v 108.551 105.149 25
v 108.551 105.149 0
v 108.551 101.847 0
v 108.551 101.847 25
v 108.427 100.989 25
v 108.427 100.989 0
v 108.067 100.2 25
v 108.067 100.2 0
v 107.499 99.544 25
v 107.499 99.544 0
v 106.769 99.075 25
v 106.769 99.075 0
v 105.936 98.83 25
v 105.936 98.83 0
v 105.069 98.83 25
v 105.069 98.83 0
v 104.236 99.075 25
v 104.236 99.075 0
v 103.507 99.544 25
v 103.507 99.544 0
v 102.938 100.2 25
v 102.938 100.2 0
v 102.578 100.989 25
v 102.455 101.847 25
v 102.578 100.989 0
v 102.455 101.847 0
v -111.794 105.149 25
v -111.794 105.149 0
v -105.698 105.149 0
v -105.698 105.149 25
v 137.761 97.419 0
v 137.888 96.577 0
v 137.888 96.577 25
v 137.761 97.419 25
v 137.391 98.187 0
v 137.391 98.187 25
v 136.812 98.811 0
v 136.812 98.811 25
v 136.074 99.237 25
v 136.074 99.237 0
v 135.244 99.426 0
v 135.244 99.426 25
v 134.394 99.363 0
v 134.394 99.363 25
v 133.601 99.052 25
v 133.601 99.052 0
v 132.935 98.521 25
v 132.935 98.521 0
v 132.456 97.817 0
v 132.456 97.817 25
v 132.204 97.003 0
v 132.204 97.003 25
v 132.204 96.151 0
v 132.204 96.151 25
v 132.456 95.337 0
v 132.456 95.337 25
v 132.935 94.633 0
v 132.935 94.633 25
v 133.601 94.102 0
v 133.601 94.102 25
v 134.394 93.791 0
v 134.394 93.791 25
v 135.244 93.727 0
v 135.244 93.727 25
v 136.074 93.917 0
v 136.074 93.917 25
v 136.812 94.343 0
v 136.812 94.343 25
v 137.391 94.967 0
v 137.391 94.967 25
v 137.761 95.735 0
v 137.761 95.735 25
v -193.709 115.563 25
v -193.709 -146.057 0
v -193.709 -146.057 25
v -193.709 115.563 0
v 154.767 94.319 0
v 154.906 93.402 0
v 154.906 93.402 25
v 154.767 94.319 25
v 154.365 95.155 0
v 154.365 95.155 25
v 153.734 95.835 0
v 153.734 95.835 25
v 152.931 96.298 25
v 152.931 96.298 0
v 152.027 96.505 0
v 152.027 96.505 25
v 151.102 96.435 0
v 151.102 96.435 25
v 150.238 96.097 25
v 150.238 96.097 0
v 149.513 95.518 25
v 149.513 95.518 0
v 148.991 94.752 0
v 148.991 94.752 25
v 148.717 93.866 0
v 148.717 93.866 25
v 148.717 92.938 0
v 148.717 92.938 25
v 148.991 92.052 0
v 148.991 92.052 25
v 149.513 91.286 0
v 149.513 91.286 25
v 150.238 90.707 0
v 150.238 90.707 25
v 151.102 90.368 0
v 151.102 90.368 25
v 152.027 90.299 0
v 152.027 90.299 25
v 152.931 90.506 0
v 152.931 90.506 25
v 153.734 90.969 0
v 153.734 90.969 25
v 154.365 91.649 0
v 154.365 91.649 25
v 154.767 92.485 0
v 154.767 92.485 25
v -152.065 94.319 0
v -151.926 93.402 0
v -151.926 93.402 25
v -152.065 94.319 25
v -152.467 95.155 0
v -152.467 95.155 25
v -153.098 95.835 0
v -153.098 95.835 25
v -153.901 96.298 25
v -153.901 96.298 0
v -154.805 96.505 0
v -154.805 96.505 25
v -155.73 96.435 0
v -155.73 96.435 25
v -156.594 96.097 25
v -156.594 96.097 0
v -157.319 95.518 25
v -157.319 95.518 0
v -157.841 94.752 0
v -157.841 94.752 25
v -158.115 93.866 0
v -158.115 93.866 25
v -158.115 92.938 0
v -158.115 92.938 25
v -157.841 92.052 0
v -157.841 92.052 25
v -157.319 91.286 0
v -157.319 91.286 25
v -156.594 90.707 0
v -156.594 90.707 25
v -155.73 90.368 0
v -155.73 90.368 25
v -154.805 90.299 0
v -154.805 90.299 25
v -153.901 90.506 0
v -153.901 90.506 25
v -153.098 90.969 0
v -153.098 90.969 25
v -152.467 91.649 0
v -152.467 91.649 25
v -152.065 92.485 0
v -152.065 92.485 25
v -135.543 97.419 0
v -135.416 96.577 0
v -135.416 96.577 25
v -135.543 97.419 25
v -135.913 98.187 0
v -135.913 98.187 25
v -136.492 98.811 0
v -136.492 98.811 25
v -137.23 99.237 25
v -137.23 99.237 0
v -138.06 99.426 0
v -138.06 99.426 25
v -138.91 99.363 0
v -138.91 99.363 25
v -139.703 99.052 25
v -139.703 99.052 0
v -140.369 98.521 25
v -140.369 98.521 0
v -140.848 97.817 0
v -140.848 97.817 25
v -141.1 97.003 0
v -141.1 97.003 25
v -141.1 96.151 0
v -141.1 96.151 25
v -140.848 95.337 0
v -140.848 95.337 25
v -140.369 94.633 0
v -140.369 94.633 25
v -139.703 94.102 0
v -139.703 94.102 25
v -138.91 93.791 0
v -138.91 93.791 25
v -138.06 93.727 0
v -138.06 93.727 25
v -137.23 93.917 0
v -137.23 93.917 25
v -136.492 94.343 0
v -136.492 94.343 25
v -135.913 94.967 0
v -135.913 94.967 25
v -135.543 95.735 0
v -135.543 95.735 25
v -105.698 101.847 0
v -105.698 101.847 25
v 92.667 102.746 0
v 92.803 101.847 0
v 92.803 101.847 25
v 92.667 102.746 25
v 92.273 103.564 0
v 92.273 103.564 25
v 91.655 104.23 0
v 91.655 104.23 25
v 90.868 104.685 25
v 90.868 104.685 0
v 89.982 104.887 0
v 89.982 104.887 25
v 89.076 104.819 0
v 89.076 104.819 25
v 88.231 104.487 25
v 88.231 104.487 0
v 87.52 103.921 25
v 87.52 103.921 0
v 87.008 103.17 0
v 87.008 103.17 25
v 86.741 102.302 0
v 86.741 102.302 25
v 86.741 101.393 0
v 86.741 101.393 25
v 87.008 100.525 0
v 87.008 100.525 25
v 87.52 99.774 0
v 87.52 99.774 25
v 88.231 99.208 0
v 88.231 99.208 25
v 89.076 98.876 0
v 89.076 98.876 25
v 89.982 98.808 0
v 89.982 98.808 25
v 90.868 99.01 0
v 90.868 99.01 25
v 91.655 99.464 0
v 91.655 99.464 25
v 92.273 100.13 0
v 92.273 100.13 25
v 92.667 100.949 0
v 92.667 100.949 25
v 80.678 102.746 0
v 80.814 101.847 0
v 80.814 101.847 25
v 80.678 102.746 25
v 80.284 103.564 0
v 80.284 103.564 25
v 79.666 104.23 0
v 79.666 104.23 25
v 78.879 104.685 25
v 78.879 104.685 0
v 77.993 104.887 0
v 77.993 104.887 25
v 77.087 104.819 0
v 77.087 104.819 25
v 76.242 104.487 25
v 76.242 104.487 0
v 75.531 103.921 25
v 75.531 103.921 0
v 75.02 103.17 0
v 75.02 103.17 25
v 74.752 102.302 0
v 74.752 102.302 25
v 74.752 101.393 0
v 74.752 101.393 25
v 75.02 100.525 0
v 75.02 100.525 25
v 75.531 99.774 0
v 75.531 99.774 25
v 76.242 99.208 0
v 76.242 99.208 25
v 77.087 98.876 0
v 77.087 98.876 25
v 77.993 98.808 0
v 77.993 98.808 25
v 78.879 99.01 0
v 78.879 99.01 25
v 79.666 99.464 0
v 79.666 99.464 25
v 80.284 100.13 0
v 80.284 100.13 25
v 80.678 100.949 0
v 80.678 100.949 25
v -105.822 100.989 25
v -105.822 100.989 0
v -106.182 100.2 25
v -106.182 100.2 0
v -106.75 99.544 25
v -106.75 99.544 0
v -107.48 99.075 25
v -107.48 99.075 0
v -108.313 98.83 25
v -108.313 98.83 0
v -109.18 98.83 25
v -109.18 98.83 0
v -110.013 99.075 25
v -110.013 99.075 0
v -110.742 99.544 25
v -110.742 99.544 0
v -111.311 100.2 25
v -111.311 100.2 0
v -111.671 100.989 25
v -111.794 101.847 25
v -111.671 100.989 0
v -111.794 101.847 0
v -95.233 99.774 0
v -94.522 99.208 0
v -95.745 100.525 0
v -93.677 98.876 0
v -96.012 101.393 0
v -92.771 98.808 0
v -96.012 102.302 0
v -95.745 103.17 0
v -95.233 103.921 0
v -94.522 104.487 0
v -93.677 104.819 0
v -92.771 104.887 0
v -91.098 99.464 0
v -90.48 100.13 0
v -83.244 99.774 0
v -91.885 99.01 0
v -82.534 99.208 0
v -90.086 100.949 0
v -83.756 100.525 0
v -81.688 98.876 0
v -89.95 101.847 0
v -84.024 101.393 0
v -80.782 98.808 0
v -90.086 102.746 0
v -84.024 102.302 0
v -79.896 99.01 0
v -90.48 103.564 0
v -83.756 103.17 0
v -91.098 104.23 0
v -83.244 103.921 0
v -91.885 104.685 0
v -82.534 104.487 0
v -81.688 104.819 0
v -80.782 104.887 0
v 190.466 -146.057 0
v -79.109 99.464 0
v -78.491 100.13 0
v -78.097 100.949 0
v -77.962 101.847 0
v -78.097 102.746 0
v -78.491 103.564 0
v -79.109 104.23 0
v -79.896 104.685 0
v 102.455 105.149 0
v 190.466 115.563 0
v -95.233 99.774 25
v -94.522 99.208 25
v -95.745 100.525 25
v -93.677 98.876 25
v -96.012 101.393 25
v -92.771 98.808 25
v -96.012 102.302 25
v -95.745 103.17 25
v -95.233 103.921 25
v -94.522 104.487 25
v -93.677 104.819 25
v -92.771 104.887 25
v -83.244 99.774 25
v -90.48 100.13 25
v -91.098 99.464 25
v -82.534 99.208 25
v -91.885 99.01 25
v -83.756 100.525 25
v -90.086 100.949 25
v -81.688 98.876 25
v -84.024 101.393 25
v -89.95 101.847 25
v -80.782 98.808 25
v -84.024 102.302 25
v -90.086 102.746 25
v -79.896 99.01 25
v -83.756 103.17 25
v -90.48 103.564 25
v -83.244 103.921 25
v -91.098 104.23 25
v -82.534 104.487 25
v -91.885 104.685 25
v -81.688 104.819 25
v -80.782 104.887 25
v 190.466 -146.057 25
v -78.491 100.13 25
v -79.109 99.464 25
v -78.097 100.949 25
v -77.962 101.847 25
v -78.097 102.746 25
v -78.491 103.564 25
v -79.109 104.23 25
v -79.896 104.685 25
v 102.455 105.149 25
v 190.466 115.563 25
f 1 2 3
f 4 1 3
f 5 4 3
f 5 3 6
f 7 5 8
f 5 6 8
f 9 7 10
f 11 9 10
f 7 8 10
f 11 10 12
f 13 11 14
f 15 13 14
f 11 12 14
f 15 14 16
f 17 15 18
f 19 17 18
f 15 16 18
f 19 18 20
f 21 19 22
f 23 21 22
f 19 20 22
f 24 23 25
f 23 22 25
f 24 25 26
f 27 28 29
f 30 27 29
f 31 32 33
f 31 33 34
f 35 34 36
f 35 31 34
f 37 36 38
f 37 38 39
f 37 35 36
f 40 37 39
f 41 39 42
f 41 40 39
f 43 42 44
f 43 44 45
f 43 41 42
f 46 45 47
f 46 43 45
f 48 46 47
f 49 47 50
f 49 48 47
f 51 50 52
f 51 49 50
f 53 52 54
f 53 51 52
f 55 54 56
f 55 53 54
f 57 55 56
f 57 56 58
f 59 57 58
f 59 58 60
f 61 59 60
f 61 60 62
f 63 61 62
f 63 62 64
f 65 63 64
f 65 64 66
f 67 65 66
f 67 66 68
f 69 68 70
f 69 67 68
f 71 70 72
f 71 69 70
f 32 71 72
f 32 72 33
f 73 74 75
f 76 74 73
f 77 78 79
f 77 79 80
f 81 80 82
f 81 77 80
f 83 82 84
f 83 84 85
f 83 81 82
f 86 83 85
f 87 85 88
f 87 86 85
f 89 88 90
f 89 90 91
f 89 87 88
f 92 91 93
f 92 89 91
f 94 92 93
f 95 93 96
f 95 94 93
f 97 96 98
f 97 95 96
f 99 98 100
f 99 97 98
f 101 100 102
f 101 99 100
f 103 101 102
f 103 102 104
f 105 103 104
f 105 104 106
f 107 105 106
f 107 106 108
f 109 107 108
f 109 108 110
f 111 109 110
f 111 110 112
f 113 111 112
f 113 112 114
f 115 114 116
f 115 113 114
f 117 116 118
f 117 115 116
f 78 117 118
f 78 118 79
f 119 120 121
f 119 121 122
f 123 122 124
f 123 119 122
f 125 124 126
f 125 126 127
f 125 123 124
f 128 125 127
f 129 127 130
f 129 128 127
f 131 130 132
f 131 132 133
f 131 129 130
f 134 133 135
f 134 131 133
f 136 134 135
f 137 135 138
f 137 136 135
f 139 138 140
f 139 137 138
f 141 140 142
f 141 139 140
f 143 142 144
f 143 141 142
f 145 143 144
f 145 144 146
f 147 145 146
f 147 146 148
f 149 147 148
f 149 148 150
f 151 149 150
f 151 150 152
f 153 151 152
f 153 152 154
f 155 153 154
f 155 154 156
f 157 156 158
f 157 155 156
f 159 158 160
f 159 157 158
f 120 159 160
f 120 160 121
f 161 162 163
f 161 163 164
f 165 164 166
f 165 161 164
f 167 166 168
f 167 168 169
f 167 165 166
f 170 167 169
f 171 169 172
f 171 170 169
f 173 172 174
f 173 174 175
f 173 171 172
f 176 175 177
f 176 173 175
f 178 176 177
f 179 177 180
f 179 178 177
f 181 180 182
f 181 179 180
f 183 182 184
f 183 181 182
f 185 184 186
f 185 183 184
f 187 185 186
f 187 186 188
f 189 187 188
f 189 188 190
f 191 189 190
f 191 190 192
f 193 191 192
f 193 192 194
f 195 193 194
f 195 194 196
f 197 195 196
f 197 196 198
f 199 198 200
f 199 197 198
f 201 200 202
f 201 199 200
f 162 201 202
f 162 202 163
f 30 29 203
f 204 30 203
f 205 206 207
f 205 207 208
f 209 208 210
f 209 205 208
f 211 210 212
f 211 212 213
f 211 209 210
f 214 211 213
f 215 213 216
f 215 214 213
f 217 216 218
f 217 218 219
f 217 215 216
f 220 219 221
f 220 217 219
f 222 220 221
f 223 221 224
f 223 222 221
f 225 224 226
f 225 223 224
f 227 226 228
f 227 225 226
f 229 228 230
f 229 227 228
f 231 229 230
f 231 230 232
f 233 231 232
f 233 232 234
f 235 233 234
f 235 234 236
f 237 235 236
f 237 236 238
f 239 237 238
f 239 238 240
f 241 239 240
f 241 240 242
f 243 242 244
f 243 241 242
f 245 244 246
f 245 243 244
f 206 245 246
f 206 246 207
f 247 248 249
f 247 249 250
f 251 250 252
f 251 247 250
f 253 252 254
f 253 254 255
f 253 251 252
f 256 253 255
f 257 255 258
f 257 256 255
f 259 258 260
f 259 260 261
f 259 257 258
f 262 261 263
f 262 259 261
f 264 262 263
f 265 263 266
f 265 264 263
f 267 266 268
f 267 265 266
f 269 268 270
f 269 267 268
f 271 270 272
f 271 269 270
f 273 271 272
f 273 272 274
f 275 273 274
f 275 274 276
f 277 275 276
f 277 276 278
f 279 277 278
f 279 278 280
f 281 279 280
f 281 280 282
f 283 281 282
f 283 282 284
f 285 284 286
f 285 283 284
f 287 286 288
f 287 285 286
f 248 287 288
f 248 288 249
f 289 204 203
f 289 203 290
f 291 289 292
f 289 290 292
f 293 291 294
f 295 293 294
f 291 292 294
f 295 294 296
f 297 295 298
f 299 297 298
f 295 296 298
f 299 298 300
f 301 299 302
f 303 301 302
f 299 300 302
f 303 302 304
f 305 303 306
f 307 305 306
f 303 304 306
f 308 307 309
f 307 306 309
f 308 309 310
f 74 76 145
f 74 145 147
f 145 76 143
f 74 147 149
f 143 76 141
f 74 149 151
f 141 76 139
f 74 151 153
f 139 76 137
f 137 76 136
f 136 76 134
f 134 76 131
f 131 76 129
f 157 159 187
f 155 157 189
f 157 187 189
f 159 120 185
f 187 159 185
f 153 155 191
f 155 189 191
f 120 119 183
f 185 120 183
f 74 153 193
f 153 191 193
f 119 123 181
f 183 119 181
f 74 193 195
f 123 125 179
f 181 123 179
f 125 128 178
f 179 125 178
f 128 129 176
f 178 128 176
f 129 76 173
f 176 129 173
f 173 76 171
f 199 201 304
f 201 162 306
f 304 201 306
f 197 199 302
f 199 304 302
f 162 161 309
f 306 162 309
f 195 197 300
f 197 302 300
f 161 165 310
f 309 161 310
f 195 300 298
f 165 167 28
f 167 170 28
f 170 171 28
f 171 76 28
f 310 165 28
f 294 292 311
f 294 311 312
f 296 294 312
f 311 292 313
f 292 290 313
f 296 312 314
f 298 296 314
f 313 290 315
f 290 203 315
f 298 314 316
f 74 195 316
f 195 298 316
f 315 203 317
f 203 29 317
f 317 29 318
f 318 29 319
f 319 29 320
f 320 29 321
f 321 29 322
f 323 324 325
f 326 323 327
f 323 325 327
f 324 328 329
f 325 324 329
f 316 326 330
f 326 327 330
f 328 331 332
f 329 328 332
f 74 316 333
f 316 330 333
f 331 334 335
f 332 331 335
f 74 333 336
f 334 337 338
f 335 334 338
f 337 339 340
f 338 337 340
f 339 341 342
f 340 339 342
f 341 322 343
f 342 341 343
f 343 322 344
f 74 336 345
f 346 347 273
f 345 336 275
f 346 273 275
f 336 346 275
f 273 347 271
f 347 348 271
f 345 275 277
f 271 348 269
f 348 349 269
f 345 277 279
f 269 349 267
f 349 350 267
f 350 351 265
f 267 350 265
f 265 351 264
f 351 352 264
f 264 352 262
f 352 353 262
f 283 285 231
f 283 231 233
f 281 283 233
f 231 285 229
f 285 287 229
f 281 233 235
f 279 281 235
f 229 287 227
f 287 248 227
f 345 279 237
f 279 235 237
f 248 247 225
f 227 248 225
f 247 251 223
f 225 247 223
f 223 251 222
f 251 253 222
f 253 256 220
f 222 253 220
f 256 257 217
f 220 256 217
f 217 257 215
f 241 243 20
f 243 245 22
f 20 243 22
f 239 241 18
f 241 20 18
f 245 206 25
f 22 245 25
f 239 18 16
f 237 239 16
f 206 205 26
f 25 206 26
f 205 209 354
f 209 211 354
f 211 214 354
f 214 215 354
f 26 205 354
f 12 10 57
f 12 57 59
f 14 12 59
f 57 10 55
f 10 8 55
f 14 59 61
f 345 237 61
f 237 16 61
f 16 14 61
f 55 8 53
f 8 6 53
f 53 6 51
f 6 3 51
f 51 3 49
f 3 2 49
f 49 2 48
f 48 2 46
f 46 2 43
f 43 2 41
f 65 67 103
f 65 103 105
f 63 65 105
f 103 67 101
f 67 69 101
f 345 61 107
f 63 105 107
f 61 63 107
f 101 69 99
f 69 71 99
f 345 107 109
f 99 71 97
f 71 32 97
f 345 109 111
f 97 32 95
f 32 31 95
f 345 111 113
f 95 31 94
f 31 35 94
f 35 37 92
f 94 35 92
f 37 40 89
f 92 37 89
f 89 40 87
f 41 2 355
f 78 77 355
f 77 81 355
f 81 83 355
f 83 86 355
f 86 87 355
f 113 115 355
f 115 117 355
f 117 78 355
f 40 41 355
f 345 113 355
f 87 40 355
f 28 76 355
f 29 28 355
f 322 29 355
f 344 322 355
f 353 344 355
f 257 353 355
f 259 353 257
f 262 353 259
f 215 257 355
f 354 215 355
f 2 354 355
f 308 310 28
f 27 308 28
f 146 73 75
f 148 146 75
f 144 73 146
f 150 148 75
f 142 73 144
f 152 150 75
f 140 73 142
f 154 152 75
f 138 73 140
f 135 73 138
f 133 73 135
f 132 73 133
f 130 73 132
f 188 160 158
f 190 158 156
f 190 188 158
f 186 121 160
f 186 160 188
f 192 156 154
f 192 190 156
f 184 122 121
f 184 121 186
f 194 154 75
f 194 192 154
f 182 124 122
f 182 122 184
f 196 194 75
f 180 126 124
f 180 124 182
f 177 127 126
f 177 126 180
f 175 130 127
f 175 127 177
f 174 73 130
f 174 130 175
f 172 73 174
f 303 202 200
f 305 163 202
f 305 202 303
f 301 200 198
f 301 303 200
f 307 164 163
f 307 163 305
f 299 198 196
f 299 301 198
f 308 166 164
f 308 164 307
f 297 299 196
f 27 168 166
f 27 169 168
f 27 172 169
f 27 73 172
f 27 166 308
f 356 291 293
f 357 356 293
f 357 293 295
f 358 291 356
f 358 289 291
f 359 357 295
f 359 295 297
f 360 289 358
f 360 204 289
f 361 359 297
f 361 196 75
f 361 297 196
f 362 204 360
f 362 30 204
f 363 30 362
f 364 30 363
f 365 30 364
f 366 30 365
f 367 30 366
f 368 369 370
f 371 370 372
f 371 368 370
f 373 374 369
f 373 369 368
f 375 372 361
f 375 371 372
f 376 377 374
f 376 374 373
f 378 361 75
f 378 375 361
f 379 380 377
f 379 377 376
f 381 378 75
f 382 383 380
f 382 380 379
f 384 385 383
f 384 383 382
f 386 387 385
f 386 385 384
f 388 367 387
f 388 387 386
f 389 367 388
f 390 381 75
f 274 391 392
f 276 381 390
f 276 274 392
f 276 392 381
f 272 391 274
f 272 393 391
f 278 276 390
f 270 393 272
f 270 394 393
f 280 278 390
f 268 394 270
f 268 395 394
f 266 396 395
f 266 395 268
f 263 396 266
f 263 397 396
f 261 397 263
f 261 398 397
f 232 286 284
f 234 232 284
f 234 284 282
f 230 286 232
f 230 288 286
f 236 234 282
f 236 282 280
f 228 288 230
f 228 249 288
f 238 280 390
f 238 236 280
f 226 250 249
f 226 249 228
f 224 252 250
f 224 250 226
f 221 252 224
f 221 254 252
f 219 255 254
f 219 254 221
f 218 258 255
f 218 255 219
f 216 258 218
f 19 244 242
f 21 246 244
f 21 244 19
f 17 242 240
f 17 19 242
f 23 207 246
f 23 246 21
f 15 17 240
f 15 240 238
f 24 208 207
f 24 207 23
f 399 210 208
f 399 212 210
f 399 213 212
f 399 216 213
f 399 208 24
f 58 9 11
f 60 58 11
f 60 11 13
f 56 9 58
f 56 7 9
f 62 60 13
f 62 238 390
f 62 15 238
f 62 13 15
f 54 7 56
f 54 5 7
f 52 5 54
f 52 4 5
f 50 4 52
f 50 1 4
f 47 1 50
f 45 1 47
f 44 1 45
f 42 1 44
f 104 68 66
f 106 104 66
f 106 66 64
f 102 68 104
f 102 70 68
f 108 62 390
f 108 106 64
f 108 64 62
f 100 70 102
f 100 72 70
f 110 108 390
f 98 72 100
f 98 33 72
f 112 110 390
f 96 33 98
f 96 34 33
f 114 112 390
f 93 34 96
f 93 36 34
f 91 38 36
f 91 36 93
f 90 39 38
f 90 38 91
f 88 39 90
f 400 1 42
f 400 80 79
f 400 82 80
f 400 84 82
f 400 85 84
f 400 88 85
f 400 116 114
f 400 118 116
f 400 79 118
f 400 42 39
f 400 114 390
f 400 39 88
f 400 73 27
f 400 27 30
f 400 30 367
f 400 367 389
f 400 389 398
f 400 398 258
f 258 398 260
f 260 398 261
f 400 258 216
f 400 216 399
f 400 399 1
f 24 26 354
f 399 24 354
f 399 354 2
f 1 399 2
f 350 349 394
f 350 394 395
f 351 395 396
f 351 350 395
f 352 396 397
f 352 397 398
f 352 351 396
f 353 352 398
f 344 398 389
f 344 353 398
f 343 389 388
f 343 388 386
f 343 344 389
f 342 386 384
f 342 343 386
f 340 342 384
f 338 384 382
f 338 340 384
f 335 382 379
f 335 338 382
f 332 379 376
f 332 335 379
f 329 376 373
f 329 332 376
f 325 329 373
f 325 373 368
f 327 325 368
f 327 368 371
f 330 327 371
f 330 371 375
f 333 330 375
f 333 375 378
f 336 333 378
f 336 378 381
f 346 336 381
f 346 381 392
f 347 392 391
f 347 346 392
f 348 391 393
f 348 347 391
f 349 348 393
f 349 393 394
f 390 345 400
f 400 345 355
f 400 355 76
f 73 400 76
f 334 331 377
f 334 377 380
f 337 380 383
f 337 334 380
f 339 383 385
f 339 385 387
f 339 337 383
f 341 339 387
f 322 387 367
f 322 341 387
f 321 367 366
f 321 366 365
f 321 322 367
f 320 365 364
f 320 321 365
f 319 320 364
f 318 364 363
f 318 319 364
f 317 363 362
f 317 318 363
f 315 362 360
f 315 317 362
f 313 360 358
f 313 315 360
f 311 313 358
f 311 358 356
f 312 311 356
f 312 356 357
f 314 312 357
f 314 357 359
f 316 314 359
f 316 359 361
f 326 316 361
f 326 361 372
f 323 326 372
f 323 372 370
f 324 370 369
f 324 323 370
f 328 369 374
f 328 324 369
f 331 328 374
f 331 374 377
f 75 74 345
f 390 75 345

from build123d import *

# Parameters (mm, degrees)
F0_W     = 192.0875
F0_H     = 261.62
F0_R     = 3.048
F0_R_2   = 2.8575
F0_R_3   = 3.1115
F1_DEPTH = 25


with BuildPart() as f1:
    # F0 (on Top) → F1 (new body)
    with BuildSketch(Plane.XY):
        with Locations((-97.6657310909, -15.2465730985)):
            Rectangle(F0_W, F0_H)
        Polygon((-159.5464810909, 107.4395775795), (-75.4724810909, 107.4395775795), (-75.4724810909, 88.3854269015), (-159.5464810909, 88.3854269015), (-159.5464810909, 100.9584269015), align=None, mode=Mode.SUBTRACT)
        with Locations((94.4217689091, -15.2465730985)):
            Rectangle(F0_W, F0_H)
        Polygon((156.3025189091, 88.3854269015), (72.2285189091, 88.3854269015), (72.2285189091, 107.4395775795), (156.3025189091, 107.4395775795), (156.3025189091, 100.9584269015), align=None, mode=Mode.SUBTRACT)
        Polygon((72.2285189091, 107.4395775795), (72.2285189091, 88.3854269015), (156.3025189091, 88.3854269015), (156.3025189091, 100.9584269015), (156.3025189091, 107.4395775795), align=None)
        with Locations((77.7657189091, 101.8474269015)):
            Circle(F0_R, mode=Mode.SUBTRACT)
        with Locations((89.7545189091, 101.8474269015)):
            Circle(F0_R, mode=Mode.SUBTRACT)
        with Locations((135.0300189091, 96.5769269015)):
            Circle(F0_R_2, mode=Mode.SUBTRACT)
        with BuildLine():
            ThreePointArc((108.5505189091, 101.8474269015), (105.5025189091, 98.7994269015), (102.4545189091, 101.8474269015))
            Line((102.4545189091, 101.8474269015), (102.4545189091, 105.1494269015))
            Line((102.4545189091, 105.1494269015), (108.5505189091, 105.1494269015))
            Line((108.5505189091, 105.1494269015), (108.5505189091, 101.8474269015))
        make_face(mode=Mode.SUBTRACT)
        with Locations((151.7940189091, 93.4019269015)):
            Circle(F0_R_3, mode=Mode.SUBTRACT)
        Polygon((-75.4724810909, 88.3854269015), (-75.4724810909, 107.4395775795), (-159.5464810909, 107.4395775795), (-159.5464810909, 100.9584269015), (-159.5464810909, 88.3854269015), align=None)
        with Locations((-155.0379810909, 93.4019269015)):
            Circle(F0_R_3, mode=Mode.SUBTRACT)
        with Locations((-138.2739810909, 96.5769269015)):
            Circle(F0_R_2, mode=Mode.SUBTRACT)
        with BuildLine():
            Line((-105.6984810909, 105.1494269015), (-105.6984810909, 101.8474269015))
            ThreePointArc((-105.6984810909, 101.8474269015), (-108.7464810909, 98.7994269015), (-111.7944810909, 101.8474269015))
            Line((-111.7944810909, 101.8474269015), (-111.7944810909, 105.1494269015))
            Line((-111.7944810909, 105.1494269015), (-105.6984810909, 105.1494269015))
        make_face(mode=Mode.SUBTRACT)
        with Locations((-92.9984810909, 101.8474269015)):
            Circle(F0_R, mode=Mode.SUBTRACT)
        with Locations((-81.0096810909, 101.8474269015)):
            Circle(F0_R, mode=Mode.SUBTRACT)
    extrude(amount=F1_DEPTH)


solid = f1.part
